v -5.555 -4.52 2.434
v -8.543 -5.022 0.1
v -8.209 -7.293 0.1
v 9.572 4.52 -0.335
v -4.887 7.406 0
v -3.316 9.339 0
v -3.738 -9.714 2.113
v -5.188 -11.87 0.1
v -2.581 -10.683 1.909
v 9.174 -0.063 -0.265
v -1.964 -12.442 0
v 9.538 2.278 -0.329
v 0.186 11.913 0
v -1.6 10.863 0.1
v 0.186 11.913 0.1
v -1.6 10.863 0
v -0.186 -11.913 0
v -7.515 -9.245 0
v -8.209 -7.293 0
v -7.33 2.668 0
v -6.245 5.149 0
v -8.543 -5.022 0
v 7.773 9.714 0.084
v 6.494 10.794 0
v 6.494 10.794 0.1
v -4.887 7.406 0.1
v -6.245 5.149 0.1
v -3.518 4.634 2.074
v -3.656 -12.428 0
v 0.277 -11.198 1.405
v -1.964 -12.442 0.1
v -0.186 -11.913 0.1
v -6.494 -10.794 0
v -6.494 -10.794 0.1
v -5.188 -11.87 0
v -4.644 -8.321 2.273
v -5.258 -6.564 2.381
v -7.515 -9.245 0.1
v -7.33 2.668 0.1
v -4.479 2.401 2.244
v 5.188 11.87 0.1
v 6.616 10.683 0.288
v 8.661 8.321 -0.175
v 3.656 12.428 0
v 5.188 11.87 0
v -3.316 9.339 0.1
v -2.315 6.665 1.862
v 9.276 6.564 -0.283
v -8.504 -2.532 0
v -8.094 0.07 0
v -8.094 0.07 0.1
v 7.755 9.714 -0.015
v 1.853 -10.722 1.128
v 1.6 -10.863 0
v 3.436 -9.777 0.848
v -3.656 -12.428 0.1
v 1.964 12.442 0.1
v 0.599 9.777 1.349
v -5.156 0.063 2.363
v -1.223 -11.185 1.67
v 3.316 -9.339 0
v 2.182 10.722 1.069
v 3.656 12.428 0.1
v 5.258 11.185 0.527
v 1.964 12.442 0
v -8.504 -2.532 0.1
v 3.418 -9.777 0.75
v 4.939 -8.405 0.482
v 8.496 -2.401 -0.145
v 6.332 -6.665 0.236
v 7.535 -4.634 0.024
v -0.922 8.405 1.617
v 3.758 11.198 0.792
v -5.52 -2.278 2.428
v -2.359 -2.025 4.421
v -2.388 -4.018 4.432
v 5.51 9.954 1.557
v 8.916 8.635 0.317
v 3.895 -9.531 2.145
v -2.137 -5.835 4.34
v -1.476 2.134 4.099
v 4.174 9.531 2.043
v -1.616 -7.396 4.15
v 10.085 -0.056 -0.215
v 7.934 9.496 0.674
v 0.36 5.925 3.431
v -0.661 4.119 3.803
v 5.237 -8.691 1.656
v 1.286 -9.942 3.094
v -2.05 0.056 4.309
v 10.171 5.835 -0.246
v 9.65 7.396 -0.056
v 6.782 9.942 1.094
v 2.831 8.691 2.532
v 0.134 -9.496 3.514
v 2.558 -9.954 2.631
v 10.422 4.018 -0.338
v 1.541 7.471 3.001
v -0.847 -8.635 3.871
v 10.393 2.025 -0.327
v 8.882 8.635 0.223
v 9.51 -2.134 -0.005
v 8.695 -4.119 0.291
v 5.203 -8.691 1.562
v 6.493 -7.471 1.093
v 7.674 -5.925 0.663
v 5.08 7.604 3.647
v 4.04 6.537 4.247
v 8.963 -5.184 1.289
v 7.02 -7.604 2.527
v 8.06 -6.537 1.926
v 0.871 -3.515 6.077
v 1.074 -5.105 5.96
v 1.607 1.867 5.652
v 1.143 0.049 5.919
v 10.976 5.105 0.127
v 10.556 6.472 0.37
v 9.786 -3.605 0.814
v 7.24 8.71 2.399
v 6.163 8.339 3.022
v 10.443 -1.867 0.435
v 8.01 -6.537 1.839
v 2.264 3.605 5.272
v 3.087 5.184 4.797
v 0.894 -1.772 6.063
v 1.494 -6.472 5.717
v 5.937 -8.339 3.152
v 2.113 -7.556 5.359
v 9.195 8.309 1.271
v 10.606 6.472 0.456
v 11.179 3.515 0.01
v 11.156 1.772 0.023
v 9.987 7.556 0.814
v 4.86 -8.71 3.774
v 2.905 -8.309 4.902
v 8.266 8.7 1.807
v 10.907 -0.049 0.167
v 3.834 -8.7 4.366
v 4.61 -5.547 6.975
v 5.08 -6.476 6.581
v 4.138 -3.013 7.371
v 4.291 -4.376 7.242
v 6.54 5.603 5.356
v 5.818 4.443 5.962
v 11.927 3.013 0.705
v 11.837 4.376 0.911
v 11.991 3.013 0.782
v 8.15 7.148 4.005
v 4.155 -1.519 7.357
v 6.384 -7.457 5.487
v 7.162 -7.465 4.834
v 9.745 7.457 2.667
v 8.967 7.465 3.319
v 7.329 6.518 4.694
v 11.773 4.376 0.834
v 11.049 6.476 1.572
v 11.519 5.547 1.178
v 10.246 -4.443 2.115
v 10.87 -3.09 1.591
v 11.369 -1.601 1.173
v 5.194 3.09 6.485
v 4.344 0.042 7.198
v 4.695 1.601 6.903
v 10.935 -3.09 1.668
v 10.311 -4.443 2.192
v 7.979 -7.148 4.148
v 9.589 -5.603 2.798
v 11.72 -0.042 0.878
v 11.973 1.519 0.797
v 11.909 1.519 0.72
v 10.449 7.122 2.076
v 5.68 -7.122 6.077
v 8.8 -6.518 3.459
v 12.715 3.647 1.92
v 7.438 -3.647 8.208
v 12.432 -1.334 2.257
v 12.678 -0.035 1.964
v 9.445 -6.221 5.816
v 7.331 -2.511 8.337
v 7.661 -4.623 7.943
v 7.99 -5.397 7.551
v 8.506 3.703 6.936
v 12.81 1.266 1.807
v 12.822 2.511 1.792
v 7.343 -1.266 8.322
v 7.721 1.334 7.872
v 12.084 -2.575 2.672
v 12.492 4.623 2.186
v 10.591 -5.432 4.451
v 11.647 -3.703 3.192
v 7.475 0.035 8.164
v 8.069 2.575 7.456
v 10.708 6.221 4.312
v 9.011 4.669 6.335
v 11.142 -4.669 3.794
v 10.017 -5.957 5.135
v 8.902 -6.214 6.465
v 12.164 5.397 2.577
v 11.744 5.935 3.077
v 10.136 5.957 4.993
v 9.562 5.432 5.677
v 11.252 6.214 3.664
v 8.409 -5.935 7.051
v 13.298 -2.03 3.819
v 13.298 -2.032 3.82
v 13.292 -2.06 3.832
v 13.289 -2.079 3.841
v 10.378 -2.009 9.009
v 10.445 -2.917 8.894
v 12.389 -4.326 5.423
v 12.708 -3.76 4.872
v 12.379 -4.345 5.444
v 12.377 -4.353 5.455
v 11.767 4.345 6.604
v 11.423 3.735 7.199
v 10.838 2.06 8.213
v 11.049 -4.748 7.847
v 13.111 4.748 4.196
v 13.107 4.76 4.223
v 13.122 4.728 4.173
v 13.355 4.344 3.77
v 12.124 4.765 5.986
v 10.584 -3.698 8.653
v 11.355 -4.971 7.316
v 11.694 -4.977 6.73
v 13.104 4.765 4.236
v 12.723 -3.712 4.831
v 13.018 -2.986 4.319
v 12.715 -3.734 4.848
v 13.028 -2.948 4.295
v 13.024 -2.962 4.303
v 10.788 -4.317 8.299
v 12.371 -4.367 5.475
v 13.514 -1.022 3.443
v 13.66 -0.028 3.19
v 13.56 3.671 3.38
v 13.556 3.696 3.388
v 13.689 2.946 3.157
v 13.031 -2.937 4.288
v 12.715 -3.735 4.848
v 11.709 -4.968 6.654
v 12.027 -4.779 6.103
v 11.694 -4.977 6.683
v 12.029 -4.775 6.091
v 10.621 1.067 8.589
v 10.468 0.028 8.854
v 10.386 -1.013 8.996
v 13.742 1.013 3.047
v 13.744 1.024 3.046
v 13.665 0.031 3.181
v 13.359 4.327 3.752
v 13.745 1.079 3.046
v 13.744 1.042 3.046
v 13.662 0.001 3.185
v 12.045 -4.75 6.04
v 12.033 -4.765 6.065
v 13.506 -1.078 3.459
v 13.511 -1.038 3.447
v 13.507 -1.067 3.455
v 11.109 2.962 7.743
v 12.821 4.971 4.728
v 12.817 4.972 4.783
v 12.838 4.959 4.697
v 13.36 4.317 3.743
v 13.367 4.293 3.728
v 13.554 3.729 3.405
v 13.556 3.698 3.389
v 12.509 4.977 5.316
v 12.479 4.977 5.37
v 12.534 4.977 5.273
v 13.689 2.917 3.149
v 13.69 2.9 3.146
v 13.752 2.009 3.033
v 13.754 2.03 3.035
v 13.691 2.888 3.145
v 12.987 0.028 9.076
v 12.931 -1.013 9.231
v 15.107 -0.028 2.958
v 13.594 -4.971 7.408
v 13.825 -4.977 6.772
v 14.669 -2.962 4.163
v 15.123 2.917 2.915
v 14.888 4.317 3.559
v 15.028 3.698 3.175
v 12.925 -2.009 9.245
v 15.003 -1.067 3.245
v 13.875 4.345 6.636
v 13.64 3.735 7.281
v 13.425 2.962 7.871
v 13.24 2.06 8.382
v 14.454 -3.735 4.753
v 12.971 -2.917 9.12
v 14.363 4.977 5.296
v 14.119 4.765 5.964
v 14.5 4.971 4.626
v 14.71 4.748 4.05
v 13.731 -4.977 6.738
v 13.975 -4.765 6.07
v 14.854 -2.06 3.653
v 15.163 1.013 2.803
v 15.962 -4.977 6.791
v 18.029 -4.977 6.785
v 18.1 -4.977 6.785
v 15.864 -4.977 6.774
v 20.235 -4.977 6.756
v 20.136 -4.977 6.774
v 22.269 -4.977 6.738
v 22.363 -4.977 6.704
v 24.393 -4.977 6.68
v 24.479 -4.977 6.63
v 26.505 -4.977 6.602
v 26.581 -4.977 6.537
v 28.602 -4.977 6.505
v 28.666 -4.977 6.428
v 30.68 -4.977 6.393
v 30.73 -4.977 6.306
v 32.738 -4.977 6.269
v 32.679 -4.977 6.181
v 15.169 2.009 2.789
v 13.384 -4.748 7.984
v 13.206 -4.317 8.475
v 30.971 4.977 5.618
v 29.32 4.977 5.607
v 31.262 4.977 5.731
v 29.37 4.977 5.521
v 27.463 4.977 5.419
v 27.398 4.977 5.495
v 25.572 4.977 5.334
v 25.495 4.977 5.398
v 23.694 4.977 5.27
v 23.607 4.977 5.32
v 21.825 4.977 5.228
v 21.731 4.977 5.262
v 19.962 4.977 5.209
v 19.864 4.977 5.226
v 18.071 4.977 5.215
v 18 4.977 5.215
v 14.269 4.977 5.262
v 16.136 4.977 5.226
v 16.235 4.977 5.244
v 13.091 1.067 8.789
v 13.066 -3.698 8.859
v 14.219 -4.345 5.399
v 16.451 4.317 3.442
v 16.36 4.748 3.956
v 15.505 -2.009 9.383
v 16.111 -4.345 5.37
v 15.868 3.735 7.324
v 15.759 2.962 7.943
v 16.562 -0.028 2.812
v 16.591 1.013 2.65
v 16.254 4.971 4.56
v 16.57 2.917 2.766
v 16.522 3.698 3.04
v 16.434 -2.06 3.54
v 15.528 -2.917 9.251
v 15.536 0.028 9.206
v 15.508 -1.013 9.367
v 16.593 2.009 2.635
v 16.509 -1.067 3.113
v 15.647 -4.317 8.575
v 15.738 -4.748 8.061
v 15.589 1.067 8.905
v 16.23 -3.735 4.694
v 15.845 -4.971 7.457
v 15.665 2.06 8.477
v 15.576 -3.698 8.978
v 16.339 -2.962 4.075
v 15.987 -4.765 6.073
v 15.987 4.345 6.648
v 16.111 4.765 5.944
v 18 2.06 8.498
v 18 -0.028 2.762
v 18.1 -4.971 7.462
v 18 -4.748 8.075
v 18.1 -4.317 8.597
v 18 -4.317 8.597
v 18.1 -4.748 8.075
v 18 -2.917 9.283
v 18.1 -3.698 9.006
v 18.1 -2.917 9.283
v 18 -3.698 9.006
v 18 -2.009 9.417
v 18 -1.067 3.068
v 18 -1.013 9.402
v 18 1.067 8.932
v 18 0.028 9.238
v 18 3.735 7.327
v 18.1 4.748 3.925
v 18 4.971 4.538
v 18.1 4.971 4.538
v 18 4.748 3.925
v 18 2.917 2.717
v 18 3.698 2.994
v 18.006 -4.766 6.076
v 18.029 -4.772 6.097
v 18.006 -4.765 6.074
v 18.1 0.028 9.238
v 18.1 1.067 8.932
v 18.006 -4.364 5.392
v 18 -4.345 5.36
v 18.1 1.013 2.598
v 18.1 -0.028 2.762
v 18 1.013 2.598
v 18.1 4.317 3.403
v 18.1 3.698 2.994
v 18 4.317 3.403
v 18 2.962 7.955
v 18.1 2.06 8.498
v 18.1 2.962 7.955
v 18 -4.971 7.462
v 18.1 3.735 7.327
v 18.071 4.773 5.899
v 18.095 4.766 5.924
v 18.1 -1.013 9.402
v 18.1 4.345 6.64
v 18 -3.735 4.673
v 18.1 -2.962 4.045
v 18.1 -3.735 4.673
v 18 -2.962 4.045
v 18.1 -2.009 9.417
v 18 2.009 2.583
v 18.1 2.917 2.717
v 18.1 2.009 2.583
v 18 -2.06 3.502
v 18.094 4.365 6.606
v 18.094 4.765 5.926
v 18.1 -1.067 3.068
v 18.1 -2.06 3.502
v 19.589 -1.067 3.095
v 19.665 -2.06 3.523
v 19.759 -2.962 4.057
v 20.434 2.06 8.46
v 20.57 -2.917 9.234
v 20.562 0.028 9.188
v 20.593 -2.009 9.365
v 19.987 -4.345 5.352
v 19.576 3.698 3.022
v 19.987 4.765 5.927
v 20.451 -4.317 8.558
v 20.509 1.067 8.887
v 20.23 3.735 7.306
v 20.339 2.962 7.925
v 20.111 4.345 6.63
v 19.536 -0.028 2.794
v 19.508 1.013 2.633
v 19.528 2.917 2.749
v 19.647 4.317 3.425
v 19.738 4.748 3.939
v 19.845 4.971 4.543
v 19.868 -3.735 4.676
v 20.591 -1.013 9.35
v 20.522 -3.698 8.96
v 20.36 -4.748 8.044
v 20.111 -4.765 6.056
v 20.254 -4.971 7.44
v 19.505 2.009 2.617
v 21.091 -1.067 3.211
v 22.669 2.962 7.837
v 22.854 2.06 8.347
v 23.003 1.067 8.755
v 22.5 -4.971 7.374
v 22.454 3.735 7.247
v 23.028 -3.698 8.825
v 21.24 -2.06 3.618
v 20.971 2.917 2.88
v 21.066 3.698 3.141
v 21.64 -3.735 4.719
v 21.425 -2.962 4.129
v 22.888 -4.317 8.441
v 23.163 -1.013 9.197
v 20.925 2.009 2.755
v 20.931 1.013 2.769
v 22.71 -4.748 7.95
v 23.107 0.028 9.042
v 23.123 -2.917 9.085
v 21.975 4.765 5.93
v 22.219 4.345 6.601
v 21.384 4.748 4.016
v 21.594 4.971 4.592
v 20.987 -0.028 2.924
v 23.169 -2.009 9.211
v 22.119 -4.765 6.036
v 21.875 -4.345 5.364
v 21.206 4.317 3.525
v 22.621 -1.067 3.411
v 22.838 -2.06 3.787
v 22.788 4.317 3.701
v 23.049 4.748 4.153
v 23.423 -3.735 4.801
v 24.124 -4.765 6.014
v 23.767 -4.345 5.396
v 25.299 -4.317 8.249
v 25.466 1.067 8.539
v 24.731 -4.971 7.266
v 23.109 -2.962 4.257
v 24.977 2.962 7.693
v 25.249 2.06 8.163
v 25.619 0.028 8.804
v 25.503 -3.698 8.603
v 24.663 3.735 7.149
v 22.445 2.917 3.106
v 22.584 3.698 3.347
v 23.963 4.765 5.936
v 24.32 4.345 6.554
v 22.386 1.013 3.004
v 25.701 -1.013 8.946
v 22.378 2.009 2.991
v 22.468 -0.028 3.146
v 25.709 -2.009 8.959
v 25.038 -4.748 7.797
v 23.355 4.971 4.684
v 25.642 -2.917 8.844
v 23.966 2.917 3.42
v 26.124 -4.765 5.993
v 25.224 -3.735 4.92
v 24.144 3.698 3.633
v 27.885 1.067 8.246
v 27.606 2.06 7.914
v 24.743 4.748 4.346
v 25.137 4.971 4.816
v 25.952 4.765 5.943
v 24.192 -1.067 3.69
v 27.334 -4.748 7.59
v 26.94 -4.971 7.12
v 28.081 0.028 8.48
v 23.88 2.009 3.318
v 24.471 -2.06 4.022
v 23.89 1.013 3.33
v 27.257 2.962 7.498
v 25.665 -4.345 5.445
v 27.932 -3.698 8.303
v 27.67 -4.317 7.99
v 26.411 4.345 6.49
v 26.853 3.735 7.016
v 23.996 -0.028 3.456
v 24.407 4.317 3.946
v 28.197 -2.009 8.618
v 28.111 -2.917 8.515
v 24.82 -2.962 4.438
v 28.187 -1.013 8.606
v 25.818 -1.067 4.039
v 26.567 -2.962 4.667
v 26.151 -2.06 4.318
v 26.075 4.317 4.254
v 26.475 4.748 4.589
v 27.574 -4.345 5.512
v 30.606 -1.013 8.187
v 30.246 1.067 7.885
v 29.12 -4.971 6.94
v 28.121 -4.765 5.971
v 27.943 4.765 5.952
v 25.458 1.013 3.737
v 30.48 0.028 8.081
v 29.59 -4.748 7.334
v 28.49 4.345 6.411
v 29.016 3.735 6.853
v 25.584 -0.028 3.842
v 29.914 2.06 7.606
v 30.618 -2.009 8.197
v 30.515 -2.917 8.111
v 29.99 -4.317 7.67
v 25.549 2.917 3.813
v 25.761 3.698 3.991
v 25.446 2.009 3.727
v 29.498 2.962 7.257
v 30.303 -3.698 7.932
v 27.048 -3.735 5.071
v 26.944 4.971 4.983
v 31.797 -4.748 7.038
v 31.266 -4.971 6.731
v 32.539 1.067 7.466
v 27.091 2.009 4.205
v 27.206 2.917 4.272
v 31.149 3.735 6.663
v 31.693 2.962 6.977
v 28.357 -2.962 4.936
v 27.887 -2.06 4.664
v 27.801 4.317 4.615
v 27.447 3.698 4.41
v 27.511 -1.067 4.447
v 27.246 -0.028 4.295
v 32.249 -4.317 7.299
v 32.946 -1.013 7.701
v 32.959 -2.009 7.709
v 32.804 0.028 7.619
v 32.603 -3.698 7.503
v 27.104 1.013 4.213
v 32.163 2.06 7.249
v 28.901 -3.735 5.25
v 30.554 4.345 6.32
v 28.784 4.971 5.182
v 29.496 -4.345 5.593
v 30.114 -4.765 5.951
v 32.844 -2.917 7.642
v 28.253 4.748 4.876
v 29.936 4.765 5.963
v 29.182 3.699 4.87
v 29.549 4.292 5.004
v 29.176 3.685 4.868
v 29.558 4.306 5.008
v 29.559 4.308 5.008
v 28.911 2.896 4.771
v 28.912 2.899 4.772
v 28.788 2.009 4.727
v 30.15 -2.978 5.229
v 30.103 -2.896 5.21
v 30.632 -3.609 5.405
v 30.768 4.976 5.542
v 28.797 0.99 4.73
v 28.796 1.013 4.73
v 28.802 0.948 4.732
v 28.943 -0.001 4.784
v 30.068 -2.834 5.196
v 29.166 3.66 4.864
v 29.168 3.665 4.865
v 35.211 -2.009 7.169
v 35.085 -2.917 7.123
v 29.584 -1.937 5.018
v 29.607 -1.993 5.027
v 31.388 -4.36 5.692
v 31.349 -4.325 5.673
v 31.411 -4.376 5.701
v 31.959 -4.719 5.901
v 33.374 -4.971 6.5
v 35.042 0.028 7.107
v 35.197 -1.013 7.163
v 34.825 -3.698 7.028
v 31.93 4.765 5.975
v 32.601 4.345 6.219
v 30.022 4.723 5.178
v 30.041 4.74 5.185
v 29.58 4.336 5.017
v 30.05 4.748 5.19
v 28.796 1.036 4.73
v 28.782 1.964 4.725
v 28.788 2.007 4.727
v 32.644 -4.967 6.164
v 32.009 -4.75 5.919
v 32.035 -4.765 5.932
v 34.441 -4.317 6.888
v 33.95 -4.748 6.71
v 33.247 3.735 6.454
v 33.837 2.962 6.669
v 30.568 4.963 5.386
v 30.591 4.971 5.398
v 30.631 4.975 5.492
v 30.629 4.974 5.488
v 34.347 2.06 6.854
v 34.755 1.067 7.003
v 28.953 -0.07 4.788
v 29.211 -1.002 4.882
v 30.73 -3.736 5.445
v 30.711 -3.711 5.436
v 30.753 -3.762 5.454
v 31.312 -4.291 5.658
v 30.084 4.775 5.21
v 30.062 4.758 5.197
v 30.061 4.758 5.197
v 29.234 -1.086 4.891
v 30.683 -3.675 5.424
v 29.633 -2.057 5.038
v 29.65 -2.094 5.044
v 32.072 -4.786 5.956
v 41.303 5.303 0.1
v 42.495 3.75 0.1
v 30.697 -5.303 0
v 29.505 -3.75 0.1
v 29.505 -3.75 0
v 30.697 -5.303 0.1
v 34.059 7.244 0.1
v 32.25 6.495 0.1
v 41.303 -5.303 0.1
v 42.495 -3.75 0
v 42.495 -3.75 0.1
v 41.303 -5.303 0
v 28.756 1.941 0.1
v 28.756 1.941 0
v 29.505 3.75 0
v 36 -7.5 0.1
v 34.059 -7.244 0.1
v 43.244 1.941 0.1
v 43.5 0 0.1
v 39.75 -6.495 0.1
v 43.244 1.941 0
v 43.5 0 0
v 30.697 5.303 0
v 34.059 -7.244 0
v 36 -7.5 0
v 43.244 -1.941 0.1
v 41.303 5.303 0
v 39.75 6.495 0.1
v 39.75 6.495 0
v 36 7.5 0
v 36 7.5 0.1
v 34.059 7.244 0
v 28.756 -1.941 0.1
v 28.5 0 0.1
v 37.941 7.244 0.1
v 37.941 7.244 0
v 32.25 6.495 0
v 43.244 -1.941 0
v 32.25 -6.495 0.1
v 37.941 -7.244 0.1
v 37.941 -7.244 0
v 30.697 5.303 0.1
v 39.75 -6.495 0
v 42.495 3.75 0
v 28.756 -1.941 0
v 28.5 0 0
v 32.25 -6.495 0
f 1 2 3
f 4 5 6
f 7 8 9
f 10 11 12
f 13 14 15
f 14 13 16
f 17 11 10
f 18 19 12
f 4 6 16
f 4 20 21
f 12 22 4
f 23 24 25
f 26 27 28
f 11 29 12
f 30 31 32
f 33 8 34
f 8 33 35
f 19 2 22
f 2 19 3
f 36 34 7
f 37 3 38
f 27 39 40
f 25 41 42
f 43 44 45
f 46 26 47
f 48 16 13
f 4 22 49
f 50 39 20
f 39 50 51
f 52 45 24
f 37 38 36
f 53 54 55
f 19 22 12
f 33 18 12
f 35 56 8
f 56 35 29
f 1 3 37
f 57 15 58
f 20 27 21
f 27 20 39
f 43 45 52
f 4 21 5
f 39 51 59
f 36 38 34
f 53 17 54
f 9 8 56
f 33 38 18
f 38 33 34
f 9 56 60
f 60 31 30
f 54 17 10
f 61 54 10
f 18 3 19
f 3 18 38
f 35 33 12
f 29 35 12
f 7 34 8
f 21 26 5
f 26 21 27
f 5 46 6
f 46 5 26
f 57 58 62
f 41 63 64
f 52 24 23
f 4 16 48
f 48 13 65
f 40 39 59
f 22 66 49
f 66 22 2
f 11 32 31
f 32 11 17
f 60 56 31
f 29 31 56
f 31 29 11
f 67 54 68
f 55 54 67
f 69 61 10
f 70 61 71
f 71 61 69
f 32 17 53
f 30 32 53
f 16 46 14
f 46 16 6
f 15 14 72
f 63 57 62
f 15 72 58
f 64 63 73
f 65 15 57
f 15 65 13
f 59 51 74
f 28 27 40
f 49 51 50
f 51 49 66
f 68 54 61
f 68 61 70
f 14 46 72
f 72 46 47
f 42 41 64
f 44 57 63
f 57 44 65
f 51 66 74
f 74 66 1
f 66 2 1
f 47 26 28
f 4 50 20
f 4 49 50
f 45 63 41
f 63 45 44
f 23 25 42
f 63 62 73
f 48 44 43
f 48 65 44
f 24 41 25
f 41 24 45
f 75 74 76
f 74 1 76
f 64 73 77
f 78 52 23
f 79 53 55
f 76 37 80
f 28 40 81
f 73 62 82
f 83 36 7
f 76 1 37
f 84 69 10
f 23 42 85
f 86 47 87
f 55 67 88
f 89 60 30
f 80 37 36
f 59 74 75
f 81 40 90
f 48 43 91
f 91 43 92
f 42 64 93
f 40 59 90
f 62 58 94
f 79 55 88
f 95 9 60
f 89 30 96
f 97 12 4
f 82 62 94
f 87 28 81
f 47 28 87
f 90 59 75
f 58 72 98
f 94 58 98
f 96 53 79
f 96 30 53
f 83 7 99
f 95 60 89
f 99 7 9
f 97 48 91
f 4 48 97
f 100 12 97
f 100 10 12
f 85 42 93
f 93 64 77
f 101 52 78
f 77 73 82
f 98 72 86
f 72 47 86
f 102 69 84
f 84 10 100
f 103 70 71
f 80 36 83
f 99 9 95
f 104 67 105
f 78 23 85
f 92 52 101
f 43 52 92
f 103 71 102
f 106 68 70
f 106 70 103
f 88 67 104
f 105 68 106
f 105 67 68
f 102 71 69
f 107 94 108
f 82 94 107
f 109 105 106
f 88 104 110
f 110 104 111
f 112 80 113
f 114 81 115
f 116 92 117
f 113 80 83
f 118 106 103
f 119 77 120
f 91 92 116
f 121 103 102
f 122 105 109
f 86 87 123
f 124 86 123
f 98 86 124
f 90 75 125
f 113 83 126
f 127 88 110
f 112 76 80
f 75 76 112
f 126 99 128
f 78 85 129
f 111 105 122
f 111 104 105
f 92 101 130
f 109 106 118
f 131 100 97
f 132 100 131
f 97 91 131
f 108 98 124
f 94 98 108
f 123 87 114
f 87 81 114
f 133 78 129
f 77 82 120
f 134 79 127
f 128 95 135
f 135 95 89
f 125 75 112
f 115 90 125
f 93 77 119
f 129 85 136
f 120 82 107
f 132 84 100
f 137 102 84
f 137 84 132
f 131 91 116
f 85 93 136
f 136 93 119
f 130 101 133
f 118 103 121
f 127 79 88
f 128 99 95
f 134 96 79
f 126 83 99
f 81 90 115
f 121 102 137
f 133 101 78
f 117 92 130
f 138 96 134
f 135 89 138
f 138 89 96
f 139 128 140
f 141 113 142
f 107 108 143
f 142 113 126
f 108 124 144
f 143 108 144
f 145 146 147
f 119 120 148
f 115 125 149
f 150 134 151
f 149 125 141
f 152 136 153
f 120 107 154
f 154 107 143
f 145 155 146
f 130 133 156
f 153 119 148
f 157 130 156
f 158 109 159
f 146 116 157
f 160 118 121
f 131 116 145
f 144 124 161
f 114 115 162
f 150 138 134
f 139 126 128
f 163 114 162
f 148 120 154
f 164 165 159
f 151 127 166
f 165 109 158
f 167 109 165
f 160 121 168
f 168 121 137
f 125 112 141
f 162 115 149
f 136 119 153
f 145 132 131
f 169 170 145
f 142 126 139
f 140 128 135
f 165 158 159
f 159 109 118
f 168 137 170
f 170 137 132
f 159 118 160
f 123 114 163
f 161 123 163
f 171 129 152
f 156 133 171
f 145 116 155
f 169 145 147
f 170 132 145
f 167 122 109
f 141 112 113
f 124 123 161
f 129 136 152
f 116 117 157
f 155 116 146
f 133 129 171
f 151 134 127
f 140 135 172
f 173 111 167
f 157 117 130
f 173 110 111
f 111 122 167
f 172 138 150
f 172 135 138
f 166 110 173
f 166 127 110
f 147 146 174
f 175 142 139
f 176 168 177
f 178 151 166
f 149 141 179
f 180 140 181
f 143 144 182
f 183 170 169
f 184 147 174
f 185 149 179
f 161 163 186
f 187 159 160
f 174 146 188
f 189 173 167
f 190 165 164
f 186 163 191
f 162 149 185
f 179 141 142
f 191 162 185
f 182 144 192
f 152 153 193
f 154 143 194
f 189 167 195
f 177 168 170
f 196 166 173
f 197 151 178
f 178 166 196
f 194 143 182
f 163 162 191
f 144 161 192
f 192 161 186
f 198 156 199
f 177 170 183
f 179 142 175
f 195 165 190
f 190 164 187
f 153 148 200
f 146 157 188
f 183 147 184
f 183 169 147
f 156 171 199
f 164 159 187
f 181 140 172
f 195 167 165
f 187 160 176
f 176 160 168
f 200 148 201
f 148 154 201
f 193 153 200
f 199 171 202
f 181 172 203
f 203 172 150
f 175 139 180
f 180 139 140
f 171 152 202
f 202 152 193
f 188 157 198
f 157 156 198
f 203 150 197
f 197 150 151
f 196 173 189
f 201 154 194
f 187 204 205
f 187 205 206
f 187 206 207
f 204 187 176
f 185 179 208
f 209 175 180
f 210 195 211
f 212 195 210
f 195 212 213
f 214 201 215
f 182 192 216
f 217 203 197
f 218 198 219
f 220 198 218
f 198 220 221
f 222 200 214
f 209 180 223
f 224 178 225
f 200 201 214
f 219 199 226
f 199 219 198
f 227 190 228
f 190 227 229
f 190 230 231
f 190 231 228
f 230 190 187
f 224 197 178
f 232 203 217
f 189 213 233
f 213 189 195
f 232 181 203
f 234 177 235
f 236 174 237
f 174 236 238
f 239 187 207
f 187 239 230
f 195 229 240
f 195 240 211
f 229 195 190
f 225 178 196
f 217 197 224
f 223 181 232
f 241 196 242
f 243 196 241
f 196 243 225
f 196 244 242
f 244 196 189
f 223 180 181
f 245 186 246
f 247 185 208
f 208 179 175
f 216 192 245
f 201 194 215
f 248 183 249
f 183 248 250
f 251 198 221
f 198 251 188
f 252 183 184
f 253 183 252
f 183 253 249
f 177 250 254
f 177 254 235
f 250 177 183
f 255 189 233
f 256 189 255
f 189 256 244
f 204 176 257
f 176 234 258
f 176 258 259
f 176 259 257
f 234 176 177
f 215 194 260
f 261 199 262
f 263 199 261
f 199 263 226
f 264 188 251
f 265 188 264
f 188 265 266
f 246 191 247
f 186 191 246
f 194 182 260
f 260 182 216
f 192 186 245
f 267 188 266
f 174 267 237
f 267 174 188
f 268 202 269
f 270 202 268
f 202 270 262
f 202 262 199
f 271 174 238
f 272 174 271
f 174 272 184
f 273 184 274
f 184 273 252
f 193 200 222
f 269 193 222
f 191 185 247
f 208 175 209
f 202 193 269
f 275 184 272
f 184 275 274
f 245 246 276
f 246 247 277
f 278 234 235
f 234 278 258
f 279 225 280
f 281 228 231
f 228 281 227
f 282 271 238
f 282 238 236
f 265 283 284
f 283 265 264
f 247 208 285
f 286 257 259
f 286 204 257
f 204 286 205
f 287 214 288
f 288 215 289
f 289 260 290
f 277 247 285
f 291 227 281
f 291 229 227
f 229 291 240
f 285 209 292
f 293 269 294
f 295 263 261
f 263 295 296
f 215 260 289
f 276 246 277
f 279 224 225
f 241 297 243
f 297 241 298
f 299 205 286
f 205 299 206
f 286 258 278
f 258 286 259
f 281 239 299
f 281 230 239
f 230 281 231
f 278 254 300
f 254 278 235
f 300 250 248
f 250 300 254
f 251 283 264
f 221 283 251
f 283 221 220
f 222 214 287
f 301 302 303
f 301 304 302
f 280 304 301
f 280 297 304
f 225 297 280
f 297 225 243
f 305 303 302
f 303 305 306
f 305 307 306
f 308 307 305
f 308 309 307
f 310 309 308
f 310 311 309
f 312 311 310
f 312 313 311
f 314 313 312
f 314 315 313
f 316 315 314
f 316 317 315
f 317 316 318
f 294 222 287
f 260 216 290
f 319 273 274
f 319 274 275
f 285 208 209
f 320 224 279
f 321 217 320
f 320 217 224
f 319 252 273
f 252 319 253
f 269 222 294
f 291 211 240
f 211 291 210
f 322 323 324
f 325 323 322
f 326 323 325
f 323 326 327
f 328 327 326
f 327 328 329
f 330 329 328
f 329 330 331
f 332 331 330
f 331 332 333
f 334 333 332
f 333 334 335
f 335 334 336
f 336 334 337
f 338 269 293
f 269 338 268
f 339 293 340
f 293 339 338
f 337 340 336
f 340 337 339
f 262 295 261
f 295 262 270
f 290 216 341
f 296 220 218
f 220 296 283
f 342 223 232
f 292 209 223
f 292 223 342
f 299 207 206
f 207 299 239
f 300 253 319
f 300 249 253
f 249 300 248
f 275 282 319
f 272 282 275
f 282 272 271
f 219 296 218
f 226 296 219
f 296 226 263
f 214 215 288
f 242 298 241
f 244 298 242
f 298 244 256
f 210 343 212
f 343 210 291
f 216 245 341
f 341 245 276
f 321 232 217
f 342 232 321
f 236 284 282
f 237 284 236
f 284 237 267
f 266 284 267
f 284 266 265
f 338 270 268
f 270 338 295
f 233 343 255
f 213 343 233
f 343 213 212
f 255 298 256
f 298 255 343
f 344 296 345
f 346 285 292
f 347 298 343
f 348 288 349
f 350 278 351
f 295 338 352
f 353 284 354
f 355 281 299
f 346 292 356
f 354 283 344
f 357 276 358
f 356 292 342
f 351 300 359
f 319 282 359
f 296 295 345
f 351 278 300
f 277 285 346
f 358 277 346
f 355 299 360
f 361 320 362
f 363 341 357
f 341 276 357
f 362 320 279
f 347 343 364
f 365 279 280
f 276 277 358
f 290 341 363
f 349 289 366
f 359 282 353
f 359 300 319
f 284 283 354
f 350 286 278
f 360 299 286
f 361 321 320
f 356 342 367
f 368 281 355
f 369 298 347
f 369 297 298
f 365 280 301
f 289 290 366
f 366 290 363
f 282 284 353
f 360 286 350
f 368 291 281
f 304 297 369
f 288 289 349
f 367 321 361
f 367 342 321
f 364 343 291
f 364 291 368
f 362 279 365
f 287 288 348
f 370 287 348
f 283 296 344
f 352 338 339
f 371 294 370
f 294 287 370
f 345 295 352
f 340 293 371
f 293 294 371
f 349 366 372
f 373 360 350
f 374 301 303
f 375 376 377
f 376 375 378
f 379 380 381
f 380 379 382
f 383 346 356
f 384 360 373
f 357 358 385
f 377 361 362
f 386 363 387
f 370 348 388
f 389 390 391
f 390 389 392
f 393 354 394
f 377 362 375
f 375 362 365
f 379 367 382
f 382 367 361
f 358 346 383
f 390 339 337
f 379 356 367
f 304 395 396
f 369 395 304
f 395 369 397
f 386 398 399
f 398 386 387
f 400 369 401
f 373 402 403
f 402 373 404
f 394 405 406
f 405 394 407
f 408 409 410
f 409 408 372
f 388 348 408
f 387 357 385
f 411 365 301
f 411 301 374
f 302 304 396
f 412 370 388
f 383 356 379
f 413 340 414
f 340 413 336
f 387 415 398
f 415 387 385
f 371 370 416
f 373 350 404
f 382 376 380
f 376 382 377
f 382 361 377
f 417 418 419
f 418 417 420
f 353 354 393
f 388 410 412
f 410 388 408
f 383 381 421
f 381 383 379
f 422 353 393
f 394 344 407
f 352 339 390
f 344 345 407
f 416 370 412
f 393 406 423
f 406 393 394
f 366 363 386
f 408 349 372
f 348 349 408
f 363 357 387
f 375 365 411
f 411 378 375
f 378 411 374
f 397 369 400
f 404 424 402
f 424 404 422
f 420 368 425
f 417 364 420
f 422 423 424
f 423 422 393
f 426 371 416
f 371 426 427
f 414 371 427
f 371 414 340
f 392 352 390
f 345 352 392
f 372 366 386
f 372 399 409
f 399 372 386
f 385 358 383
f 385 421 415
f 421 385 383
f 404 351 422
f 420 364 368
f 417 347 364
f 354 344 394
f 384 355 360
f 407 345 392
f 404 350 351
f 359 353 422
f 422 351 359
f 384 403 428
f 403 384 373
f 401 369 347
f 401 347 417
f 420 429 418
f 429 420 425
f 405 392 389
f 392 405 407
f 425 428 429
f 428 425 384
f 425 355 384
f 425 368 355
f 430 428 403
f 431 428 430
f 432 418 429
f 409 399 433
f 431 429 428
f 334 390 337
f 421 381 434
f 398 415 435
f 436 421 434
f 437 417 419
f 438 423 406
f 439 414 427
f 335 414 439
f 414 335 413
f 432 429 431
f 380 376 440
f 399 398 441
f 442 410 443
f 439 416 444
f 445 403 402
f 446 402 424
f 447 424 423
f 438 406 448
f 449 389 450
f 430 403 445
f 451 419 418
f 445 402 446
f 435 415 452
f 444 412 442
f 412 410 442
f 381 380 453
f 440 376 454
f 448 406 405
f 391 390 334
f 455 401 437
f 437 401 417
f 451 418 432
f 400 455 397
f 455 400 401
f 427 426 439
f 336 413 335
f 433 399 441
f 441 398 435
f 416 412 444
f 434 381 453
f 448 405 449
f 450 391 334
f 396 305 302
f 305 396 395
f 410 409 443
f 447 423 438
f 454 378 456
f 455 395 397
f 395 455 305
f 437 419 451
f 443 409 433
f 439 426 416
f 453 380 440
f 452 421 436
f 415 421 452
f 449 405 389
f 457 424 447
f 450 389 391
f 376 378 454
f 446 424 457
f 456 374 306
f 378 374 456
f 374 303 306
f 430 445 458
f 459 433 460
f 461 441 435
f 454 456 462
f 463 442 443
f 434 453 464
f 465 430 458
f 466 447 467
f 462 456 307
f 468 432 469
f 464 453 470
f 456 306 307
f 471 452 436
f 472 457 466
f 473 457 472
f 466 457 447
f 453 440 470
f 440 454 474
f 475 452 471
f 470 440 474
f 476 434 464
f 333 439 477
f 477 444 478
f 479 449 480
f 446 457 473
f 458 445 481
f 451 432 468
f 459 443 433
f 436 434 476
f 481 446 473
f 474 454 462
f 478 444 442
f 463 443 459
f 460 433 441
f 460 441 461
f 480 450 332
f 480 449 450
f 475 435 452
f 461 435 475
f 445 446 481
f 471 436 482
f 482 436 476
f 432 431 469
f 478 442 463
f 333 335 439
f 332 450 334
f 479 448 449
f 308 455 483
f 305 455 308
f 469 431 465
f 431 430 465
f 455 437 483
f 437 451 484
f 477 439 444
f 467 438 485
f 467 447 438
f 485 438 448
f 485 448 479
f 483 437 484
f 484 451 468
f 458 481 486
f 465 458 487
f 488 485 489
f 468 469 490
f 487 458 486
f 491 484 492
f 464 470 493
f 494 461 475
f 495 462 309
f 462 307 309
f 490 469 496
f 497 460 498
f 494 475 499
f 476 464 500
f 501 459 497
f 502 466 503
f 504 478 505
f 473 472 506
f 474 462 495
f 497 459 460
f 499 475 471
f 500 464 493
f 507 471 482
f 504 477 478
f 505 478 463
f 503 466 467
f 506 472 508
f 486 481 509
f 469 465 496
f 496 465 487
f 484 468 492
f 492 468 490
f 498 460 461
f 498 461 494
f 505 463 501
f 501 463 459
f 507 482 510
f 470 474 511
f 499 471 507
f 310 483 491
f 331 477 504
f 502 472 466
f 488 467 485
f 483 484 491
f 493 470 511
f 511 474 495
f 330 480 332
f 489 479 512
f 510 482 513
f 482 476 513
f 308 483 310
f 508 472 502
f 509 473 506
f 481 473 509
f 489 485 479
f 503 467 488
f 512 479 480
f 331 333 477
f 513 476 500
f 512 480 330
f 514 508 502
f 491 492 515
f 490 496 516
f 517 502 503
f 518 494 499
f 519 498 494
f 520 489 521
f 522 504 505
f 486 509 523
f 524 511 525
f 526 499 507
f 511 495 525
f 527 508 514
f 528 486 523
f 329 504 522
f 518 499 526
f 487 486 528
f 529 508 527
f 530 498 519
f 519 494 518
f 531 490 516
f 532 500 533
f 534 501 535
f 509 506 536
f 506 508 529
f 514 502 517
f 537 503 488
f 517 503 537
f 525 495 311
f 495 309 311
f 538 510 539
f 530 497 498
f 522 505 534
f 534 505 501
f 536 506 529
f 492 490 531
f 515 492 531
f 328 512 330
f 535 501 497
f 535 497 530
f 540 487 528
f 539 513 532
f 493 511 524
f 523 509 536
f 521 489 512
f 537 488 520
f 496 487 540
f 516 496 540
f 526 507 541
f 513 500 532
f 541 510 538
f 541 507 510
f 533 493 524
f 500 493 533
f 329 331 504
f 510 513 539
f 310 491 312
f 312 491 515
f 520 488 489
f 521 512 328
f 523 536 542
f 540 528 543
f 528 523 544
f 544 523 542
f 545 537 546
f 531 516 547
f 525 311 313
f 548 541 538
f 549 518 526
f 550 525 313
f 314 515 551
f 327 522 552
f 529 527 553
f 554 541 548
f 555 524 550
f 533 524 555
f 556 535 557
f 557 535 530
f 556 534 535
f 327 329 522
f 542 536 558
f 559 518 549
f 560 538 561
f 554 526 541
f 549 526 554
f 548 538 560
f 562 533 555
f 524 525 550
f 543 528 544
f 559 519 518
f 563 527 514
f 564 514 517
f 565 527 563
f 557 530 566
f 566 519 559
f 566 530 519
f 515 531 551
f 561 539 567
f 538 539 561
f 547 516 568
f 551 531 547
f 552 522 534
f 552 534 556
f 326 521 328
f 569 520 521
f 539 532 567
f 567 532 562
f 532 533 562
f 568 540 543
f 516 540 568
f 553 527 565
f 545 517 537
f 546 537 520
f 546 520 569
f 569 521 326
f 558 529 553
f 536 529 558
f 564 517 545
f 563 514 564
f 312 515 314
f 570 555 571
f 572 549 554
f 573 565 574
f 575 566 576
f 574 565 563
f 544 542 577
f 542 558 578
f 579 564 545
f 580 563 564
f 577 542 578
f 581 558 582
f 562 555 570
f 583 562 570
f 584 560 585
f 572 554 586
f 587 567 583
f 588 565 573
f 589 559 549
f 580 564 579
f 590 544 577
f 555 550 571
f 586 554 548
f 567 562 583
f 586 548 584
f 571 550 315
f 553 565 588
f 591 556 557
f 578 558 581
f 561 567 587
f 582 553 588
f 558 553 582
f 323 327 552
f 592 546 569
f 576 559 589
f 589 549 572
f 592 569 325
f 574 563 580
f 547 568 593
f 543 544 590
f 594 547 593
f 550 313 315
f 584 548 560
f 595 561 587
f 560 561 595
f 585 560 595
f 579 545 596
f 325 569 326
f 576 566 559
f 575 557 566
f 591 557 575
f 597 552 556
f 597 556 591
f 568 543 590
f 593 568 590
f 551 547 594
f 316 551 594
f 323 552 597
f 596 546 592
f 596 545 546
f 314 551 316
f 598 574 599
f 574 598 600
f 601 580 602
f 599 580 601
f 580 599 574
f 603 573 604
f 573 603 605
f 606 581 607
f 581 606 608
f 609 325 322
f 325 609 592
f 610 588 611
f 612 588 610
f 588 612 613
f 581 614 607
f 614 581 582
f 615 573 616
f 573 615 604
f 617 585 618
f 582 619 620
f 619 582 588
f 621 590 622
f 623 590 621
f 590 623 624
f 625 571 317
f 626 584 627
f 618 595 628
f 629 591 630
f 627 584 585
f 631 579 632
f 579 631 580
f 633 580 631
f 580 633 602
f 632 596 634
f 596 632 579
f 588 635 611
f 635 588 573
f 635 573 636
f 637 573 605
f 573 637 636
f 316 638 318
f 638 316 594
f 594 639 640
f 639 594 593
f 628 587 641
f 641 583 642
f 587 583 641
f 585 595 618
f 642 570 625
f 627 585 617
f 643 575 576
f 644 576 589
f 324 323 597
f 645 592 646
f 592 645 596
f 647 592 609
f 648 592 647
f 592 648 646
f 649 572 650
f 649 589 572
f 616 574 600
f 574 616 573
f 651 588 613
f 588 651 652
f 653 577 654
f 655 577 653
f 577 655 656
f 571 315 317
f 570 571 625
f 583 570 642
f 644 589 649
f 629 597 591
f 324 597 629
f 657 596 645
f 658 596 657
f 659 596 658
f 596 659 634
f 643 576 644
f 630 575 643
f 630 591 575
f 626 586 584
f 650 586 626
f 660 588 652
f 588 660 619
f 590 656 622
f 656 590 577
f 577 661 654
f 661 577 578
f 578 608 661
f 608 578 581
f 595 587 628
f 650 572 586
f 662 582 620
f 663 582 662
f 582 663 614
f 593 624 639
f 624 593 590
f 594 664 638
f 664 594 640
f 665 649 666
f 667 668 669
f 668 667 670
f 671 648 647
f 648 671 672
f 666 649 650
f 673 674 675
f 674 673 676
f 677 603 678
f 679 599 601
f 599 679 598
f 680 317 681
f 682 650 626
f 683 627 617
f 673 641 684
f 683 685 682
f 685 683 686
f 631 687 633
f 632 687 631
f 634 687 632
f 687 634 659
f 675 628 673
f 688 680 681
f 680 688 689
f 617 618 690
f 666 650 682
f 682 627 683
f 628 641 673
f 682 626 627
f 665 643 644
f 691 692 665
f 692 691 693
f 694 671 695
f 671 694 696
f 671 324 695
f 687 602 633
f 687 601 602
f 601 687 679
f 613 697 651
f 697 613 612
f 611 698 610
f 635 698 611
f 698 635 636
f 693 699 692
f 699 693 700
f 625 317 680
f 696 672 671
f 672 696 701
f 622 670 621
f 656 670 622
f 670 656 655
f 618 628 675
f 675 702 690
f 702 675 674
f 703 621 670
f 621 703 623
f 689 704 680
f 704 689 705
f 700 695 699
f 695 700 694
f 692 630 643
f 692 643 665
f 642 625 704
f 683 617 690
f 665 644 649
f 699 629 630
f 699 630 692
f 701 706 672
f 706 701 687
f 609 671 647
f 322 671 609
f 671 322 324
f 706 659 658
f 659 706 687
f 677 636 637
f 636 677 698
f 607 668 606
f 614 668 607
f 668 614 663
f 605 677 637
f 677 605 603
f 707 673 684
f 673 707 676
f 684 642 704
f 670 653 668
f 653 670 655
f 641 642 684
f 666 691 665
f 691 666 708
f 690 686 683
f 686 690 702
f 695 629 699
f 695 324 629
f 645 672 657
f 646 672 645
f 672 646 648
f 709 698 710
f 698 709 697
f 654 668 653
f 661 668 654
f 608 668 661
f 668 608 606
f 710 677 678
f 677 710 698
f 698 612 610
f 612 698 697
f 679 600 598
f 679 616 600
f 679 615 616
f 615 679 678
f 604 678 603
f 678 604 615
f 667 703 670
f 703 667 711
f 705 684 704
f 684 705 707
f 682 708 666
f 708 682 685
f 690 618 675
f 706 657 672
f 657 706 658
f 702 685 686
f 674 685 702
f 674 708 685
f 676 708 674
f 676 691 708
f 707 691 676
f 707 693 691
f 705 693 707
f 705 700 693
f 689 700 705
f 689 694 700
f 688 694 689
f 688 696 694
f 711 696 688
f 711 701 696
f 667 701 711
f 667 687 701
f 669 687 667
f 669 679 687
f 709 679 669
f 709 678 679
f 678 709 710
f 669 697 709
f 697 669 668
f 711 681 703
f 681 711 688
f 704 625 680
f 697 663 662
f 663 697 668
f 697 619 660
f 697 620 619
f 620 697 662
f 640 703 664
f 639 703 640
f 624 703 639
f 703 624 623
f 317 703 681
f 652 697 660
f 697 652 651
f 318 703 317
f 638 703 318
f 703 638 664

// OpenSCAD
module nariz(){
rotate([0,0,-20])scale([0.6,1,1])cylinder(r=26/2,h=0.1);
}


module agarre(){
translate([36,0,0])scale([1,1,1])cylinder(r=15/2,h=0.1);
}

for(i=[0:5])
hull(){
translate([i*2,0,i])rotate([0,10*i,0])scale([1-0.1*i,1-0.1*i,1])nariz();
translate([(i+1)*2,0,i+1])rotate([0,10*(i+1),0])scale([1-0.1*(i+1),1-0.1*(i+1),1])nariz();
}
for(i=[6:15])
hull(){
translate([i*2,0,6])rotate([0,10*i,0])scale([1-0.1*6,1-0.1*6,1])nariz();
translate([(i+1)*2,0,6])rotate([0,10*(i+1),0])scale([1-0.1*(6),1-0.1*(6),1])nariz();
}

hull(){
translate([16*2,0,6])rotate([0,10*16,0])scale([1-0.1*6,1-0.1*6,1])nariz();
agarre();
}
